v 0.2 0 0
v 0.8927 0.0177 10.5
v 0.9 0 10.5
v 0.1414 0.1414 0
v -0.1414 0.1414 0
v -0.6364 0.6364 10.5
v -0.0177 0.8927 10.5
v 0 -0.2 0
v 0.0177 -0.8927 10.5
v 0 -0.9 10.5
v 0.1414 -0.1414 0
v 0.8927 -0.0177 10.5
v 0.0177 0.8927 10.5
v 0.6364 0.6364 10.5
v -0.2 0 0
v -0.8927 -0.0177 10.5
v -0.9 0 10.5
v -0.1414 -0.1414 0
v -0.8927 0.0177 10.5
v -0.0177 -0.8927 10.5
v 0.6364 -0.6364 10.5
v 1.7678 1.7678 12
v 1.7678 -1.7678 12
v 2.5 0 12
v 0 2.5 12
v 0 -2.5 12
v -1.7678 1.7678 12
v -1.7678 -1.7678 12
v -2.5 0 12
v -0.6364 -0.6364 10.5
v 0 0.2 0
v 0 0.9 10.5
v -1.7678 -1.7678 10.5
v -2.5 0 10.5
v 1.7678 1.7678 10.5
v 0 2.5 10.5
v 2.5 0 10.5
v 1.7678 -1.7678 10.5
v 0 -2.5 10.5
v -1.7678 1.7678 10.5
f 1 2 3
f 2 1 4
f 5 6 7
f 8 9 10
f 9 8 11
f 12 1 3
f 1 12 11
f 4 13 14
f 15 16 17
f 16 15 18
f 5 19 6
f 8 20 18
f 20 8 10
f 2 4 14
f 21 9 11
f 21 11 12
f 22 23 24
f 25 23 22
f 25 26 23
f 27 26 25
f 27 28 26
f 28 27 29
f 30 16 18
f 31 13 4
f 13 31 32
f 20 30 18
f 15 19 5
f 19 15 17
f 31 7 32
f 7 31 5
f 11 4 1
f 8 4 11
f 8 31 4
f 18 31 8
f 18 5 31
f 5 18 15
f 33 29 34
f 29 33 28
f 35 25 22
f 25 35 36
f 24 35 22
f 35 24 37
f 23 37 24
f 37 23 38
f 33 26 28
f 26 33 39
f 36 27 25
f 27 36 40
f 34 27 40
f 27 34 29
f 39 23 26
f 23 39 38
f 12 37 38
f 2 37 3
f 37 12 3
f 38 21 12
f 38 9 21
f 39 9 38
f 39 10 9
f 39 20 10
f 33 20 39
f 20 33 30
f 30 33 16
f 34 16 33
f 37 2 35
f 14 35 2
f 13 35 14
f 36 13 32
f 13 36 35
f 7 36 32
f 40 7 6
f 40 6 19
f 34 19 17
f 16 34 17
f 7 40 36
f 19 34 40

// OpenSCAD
// file: _cookie_cutter.scad
rim_bottom_width = .4;
rim_top_width = 2;
rim_height = 12;
rim_base_height = 1.5;
rim_base_width = 5;


module rim_shape() {
	union() {
		cylinder(h = rim_height, d1 = rim_bottom_width, d2 = rim_top_width, $fn = 8);
		
		translate([0, 0, rim_height - rim_base_height])
			cylinder(h = rim_base_height, d = rim_base_width, $fn = 8);
	}
}

module cookie_cutter() {
	union() {
		minkowski() {
			linear_extrude(height = .001) {
				difference() {
					minkowski() {
						children(0);
						circle(r = .01, $fn = 4);
					}
					
					children(0);
				}
			}
			
			rim_shape();
		}
		
		if ($children > 1) {
			translate([0, 0, rim_height - rim_base_height])
				linear_extrude(height = rim_base_height)
					children(1);
		}
	}
}
// main file
use <_cookie_cutter.scad>

render(convexity = 10)
	cookie_cutter()
		import("dip8.dxf");
